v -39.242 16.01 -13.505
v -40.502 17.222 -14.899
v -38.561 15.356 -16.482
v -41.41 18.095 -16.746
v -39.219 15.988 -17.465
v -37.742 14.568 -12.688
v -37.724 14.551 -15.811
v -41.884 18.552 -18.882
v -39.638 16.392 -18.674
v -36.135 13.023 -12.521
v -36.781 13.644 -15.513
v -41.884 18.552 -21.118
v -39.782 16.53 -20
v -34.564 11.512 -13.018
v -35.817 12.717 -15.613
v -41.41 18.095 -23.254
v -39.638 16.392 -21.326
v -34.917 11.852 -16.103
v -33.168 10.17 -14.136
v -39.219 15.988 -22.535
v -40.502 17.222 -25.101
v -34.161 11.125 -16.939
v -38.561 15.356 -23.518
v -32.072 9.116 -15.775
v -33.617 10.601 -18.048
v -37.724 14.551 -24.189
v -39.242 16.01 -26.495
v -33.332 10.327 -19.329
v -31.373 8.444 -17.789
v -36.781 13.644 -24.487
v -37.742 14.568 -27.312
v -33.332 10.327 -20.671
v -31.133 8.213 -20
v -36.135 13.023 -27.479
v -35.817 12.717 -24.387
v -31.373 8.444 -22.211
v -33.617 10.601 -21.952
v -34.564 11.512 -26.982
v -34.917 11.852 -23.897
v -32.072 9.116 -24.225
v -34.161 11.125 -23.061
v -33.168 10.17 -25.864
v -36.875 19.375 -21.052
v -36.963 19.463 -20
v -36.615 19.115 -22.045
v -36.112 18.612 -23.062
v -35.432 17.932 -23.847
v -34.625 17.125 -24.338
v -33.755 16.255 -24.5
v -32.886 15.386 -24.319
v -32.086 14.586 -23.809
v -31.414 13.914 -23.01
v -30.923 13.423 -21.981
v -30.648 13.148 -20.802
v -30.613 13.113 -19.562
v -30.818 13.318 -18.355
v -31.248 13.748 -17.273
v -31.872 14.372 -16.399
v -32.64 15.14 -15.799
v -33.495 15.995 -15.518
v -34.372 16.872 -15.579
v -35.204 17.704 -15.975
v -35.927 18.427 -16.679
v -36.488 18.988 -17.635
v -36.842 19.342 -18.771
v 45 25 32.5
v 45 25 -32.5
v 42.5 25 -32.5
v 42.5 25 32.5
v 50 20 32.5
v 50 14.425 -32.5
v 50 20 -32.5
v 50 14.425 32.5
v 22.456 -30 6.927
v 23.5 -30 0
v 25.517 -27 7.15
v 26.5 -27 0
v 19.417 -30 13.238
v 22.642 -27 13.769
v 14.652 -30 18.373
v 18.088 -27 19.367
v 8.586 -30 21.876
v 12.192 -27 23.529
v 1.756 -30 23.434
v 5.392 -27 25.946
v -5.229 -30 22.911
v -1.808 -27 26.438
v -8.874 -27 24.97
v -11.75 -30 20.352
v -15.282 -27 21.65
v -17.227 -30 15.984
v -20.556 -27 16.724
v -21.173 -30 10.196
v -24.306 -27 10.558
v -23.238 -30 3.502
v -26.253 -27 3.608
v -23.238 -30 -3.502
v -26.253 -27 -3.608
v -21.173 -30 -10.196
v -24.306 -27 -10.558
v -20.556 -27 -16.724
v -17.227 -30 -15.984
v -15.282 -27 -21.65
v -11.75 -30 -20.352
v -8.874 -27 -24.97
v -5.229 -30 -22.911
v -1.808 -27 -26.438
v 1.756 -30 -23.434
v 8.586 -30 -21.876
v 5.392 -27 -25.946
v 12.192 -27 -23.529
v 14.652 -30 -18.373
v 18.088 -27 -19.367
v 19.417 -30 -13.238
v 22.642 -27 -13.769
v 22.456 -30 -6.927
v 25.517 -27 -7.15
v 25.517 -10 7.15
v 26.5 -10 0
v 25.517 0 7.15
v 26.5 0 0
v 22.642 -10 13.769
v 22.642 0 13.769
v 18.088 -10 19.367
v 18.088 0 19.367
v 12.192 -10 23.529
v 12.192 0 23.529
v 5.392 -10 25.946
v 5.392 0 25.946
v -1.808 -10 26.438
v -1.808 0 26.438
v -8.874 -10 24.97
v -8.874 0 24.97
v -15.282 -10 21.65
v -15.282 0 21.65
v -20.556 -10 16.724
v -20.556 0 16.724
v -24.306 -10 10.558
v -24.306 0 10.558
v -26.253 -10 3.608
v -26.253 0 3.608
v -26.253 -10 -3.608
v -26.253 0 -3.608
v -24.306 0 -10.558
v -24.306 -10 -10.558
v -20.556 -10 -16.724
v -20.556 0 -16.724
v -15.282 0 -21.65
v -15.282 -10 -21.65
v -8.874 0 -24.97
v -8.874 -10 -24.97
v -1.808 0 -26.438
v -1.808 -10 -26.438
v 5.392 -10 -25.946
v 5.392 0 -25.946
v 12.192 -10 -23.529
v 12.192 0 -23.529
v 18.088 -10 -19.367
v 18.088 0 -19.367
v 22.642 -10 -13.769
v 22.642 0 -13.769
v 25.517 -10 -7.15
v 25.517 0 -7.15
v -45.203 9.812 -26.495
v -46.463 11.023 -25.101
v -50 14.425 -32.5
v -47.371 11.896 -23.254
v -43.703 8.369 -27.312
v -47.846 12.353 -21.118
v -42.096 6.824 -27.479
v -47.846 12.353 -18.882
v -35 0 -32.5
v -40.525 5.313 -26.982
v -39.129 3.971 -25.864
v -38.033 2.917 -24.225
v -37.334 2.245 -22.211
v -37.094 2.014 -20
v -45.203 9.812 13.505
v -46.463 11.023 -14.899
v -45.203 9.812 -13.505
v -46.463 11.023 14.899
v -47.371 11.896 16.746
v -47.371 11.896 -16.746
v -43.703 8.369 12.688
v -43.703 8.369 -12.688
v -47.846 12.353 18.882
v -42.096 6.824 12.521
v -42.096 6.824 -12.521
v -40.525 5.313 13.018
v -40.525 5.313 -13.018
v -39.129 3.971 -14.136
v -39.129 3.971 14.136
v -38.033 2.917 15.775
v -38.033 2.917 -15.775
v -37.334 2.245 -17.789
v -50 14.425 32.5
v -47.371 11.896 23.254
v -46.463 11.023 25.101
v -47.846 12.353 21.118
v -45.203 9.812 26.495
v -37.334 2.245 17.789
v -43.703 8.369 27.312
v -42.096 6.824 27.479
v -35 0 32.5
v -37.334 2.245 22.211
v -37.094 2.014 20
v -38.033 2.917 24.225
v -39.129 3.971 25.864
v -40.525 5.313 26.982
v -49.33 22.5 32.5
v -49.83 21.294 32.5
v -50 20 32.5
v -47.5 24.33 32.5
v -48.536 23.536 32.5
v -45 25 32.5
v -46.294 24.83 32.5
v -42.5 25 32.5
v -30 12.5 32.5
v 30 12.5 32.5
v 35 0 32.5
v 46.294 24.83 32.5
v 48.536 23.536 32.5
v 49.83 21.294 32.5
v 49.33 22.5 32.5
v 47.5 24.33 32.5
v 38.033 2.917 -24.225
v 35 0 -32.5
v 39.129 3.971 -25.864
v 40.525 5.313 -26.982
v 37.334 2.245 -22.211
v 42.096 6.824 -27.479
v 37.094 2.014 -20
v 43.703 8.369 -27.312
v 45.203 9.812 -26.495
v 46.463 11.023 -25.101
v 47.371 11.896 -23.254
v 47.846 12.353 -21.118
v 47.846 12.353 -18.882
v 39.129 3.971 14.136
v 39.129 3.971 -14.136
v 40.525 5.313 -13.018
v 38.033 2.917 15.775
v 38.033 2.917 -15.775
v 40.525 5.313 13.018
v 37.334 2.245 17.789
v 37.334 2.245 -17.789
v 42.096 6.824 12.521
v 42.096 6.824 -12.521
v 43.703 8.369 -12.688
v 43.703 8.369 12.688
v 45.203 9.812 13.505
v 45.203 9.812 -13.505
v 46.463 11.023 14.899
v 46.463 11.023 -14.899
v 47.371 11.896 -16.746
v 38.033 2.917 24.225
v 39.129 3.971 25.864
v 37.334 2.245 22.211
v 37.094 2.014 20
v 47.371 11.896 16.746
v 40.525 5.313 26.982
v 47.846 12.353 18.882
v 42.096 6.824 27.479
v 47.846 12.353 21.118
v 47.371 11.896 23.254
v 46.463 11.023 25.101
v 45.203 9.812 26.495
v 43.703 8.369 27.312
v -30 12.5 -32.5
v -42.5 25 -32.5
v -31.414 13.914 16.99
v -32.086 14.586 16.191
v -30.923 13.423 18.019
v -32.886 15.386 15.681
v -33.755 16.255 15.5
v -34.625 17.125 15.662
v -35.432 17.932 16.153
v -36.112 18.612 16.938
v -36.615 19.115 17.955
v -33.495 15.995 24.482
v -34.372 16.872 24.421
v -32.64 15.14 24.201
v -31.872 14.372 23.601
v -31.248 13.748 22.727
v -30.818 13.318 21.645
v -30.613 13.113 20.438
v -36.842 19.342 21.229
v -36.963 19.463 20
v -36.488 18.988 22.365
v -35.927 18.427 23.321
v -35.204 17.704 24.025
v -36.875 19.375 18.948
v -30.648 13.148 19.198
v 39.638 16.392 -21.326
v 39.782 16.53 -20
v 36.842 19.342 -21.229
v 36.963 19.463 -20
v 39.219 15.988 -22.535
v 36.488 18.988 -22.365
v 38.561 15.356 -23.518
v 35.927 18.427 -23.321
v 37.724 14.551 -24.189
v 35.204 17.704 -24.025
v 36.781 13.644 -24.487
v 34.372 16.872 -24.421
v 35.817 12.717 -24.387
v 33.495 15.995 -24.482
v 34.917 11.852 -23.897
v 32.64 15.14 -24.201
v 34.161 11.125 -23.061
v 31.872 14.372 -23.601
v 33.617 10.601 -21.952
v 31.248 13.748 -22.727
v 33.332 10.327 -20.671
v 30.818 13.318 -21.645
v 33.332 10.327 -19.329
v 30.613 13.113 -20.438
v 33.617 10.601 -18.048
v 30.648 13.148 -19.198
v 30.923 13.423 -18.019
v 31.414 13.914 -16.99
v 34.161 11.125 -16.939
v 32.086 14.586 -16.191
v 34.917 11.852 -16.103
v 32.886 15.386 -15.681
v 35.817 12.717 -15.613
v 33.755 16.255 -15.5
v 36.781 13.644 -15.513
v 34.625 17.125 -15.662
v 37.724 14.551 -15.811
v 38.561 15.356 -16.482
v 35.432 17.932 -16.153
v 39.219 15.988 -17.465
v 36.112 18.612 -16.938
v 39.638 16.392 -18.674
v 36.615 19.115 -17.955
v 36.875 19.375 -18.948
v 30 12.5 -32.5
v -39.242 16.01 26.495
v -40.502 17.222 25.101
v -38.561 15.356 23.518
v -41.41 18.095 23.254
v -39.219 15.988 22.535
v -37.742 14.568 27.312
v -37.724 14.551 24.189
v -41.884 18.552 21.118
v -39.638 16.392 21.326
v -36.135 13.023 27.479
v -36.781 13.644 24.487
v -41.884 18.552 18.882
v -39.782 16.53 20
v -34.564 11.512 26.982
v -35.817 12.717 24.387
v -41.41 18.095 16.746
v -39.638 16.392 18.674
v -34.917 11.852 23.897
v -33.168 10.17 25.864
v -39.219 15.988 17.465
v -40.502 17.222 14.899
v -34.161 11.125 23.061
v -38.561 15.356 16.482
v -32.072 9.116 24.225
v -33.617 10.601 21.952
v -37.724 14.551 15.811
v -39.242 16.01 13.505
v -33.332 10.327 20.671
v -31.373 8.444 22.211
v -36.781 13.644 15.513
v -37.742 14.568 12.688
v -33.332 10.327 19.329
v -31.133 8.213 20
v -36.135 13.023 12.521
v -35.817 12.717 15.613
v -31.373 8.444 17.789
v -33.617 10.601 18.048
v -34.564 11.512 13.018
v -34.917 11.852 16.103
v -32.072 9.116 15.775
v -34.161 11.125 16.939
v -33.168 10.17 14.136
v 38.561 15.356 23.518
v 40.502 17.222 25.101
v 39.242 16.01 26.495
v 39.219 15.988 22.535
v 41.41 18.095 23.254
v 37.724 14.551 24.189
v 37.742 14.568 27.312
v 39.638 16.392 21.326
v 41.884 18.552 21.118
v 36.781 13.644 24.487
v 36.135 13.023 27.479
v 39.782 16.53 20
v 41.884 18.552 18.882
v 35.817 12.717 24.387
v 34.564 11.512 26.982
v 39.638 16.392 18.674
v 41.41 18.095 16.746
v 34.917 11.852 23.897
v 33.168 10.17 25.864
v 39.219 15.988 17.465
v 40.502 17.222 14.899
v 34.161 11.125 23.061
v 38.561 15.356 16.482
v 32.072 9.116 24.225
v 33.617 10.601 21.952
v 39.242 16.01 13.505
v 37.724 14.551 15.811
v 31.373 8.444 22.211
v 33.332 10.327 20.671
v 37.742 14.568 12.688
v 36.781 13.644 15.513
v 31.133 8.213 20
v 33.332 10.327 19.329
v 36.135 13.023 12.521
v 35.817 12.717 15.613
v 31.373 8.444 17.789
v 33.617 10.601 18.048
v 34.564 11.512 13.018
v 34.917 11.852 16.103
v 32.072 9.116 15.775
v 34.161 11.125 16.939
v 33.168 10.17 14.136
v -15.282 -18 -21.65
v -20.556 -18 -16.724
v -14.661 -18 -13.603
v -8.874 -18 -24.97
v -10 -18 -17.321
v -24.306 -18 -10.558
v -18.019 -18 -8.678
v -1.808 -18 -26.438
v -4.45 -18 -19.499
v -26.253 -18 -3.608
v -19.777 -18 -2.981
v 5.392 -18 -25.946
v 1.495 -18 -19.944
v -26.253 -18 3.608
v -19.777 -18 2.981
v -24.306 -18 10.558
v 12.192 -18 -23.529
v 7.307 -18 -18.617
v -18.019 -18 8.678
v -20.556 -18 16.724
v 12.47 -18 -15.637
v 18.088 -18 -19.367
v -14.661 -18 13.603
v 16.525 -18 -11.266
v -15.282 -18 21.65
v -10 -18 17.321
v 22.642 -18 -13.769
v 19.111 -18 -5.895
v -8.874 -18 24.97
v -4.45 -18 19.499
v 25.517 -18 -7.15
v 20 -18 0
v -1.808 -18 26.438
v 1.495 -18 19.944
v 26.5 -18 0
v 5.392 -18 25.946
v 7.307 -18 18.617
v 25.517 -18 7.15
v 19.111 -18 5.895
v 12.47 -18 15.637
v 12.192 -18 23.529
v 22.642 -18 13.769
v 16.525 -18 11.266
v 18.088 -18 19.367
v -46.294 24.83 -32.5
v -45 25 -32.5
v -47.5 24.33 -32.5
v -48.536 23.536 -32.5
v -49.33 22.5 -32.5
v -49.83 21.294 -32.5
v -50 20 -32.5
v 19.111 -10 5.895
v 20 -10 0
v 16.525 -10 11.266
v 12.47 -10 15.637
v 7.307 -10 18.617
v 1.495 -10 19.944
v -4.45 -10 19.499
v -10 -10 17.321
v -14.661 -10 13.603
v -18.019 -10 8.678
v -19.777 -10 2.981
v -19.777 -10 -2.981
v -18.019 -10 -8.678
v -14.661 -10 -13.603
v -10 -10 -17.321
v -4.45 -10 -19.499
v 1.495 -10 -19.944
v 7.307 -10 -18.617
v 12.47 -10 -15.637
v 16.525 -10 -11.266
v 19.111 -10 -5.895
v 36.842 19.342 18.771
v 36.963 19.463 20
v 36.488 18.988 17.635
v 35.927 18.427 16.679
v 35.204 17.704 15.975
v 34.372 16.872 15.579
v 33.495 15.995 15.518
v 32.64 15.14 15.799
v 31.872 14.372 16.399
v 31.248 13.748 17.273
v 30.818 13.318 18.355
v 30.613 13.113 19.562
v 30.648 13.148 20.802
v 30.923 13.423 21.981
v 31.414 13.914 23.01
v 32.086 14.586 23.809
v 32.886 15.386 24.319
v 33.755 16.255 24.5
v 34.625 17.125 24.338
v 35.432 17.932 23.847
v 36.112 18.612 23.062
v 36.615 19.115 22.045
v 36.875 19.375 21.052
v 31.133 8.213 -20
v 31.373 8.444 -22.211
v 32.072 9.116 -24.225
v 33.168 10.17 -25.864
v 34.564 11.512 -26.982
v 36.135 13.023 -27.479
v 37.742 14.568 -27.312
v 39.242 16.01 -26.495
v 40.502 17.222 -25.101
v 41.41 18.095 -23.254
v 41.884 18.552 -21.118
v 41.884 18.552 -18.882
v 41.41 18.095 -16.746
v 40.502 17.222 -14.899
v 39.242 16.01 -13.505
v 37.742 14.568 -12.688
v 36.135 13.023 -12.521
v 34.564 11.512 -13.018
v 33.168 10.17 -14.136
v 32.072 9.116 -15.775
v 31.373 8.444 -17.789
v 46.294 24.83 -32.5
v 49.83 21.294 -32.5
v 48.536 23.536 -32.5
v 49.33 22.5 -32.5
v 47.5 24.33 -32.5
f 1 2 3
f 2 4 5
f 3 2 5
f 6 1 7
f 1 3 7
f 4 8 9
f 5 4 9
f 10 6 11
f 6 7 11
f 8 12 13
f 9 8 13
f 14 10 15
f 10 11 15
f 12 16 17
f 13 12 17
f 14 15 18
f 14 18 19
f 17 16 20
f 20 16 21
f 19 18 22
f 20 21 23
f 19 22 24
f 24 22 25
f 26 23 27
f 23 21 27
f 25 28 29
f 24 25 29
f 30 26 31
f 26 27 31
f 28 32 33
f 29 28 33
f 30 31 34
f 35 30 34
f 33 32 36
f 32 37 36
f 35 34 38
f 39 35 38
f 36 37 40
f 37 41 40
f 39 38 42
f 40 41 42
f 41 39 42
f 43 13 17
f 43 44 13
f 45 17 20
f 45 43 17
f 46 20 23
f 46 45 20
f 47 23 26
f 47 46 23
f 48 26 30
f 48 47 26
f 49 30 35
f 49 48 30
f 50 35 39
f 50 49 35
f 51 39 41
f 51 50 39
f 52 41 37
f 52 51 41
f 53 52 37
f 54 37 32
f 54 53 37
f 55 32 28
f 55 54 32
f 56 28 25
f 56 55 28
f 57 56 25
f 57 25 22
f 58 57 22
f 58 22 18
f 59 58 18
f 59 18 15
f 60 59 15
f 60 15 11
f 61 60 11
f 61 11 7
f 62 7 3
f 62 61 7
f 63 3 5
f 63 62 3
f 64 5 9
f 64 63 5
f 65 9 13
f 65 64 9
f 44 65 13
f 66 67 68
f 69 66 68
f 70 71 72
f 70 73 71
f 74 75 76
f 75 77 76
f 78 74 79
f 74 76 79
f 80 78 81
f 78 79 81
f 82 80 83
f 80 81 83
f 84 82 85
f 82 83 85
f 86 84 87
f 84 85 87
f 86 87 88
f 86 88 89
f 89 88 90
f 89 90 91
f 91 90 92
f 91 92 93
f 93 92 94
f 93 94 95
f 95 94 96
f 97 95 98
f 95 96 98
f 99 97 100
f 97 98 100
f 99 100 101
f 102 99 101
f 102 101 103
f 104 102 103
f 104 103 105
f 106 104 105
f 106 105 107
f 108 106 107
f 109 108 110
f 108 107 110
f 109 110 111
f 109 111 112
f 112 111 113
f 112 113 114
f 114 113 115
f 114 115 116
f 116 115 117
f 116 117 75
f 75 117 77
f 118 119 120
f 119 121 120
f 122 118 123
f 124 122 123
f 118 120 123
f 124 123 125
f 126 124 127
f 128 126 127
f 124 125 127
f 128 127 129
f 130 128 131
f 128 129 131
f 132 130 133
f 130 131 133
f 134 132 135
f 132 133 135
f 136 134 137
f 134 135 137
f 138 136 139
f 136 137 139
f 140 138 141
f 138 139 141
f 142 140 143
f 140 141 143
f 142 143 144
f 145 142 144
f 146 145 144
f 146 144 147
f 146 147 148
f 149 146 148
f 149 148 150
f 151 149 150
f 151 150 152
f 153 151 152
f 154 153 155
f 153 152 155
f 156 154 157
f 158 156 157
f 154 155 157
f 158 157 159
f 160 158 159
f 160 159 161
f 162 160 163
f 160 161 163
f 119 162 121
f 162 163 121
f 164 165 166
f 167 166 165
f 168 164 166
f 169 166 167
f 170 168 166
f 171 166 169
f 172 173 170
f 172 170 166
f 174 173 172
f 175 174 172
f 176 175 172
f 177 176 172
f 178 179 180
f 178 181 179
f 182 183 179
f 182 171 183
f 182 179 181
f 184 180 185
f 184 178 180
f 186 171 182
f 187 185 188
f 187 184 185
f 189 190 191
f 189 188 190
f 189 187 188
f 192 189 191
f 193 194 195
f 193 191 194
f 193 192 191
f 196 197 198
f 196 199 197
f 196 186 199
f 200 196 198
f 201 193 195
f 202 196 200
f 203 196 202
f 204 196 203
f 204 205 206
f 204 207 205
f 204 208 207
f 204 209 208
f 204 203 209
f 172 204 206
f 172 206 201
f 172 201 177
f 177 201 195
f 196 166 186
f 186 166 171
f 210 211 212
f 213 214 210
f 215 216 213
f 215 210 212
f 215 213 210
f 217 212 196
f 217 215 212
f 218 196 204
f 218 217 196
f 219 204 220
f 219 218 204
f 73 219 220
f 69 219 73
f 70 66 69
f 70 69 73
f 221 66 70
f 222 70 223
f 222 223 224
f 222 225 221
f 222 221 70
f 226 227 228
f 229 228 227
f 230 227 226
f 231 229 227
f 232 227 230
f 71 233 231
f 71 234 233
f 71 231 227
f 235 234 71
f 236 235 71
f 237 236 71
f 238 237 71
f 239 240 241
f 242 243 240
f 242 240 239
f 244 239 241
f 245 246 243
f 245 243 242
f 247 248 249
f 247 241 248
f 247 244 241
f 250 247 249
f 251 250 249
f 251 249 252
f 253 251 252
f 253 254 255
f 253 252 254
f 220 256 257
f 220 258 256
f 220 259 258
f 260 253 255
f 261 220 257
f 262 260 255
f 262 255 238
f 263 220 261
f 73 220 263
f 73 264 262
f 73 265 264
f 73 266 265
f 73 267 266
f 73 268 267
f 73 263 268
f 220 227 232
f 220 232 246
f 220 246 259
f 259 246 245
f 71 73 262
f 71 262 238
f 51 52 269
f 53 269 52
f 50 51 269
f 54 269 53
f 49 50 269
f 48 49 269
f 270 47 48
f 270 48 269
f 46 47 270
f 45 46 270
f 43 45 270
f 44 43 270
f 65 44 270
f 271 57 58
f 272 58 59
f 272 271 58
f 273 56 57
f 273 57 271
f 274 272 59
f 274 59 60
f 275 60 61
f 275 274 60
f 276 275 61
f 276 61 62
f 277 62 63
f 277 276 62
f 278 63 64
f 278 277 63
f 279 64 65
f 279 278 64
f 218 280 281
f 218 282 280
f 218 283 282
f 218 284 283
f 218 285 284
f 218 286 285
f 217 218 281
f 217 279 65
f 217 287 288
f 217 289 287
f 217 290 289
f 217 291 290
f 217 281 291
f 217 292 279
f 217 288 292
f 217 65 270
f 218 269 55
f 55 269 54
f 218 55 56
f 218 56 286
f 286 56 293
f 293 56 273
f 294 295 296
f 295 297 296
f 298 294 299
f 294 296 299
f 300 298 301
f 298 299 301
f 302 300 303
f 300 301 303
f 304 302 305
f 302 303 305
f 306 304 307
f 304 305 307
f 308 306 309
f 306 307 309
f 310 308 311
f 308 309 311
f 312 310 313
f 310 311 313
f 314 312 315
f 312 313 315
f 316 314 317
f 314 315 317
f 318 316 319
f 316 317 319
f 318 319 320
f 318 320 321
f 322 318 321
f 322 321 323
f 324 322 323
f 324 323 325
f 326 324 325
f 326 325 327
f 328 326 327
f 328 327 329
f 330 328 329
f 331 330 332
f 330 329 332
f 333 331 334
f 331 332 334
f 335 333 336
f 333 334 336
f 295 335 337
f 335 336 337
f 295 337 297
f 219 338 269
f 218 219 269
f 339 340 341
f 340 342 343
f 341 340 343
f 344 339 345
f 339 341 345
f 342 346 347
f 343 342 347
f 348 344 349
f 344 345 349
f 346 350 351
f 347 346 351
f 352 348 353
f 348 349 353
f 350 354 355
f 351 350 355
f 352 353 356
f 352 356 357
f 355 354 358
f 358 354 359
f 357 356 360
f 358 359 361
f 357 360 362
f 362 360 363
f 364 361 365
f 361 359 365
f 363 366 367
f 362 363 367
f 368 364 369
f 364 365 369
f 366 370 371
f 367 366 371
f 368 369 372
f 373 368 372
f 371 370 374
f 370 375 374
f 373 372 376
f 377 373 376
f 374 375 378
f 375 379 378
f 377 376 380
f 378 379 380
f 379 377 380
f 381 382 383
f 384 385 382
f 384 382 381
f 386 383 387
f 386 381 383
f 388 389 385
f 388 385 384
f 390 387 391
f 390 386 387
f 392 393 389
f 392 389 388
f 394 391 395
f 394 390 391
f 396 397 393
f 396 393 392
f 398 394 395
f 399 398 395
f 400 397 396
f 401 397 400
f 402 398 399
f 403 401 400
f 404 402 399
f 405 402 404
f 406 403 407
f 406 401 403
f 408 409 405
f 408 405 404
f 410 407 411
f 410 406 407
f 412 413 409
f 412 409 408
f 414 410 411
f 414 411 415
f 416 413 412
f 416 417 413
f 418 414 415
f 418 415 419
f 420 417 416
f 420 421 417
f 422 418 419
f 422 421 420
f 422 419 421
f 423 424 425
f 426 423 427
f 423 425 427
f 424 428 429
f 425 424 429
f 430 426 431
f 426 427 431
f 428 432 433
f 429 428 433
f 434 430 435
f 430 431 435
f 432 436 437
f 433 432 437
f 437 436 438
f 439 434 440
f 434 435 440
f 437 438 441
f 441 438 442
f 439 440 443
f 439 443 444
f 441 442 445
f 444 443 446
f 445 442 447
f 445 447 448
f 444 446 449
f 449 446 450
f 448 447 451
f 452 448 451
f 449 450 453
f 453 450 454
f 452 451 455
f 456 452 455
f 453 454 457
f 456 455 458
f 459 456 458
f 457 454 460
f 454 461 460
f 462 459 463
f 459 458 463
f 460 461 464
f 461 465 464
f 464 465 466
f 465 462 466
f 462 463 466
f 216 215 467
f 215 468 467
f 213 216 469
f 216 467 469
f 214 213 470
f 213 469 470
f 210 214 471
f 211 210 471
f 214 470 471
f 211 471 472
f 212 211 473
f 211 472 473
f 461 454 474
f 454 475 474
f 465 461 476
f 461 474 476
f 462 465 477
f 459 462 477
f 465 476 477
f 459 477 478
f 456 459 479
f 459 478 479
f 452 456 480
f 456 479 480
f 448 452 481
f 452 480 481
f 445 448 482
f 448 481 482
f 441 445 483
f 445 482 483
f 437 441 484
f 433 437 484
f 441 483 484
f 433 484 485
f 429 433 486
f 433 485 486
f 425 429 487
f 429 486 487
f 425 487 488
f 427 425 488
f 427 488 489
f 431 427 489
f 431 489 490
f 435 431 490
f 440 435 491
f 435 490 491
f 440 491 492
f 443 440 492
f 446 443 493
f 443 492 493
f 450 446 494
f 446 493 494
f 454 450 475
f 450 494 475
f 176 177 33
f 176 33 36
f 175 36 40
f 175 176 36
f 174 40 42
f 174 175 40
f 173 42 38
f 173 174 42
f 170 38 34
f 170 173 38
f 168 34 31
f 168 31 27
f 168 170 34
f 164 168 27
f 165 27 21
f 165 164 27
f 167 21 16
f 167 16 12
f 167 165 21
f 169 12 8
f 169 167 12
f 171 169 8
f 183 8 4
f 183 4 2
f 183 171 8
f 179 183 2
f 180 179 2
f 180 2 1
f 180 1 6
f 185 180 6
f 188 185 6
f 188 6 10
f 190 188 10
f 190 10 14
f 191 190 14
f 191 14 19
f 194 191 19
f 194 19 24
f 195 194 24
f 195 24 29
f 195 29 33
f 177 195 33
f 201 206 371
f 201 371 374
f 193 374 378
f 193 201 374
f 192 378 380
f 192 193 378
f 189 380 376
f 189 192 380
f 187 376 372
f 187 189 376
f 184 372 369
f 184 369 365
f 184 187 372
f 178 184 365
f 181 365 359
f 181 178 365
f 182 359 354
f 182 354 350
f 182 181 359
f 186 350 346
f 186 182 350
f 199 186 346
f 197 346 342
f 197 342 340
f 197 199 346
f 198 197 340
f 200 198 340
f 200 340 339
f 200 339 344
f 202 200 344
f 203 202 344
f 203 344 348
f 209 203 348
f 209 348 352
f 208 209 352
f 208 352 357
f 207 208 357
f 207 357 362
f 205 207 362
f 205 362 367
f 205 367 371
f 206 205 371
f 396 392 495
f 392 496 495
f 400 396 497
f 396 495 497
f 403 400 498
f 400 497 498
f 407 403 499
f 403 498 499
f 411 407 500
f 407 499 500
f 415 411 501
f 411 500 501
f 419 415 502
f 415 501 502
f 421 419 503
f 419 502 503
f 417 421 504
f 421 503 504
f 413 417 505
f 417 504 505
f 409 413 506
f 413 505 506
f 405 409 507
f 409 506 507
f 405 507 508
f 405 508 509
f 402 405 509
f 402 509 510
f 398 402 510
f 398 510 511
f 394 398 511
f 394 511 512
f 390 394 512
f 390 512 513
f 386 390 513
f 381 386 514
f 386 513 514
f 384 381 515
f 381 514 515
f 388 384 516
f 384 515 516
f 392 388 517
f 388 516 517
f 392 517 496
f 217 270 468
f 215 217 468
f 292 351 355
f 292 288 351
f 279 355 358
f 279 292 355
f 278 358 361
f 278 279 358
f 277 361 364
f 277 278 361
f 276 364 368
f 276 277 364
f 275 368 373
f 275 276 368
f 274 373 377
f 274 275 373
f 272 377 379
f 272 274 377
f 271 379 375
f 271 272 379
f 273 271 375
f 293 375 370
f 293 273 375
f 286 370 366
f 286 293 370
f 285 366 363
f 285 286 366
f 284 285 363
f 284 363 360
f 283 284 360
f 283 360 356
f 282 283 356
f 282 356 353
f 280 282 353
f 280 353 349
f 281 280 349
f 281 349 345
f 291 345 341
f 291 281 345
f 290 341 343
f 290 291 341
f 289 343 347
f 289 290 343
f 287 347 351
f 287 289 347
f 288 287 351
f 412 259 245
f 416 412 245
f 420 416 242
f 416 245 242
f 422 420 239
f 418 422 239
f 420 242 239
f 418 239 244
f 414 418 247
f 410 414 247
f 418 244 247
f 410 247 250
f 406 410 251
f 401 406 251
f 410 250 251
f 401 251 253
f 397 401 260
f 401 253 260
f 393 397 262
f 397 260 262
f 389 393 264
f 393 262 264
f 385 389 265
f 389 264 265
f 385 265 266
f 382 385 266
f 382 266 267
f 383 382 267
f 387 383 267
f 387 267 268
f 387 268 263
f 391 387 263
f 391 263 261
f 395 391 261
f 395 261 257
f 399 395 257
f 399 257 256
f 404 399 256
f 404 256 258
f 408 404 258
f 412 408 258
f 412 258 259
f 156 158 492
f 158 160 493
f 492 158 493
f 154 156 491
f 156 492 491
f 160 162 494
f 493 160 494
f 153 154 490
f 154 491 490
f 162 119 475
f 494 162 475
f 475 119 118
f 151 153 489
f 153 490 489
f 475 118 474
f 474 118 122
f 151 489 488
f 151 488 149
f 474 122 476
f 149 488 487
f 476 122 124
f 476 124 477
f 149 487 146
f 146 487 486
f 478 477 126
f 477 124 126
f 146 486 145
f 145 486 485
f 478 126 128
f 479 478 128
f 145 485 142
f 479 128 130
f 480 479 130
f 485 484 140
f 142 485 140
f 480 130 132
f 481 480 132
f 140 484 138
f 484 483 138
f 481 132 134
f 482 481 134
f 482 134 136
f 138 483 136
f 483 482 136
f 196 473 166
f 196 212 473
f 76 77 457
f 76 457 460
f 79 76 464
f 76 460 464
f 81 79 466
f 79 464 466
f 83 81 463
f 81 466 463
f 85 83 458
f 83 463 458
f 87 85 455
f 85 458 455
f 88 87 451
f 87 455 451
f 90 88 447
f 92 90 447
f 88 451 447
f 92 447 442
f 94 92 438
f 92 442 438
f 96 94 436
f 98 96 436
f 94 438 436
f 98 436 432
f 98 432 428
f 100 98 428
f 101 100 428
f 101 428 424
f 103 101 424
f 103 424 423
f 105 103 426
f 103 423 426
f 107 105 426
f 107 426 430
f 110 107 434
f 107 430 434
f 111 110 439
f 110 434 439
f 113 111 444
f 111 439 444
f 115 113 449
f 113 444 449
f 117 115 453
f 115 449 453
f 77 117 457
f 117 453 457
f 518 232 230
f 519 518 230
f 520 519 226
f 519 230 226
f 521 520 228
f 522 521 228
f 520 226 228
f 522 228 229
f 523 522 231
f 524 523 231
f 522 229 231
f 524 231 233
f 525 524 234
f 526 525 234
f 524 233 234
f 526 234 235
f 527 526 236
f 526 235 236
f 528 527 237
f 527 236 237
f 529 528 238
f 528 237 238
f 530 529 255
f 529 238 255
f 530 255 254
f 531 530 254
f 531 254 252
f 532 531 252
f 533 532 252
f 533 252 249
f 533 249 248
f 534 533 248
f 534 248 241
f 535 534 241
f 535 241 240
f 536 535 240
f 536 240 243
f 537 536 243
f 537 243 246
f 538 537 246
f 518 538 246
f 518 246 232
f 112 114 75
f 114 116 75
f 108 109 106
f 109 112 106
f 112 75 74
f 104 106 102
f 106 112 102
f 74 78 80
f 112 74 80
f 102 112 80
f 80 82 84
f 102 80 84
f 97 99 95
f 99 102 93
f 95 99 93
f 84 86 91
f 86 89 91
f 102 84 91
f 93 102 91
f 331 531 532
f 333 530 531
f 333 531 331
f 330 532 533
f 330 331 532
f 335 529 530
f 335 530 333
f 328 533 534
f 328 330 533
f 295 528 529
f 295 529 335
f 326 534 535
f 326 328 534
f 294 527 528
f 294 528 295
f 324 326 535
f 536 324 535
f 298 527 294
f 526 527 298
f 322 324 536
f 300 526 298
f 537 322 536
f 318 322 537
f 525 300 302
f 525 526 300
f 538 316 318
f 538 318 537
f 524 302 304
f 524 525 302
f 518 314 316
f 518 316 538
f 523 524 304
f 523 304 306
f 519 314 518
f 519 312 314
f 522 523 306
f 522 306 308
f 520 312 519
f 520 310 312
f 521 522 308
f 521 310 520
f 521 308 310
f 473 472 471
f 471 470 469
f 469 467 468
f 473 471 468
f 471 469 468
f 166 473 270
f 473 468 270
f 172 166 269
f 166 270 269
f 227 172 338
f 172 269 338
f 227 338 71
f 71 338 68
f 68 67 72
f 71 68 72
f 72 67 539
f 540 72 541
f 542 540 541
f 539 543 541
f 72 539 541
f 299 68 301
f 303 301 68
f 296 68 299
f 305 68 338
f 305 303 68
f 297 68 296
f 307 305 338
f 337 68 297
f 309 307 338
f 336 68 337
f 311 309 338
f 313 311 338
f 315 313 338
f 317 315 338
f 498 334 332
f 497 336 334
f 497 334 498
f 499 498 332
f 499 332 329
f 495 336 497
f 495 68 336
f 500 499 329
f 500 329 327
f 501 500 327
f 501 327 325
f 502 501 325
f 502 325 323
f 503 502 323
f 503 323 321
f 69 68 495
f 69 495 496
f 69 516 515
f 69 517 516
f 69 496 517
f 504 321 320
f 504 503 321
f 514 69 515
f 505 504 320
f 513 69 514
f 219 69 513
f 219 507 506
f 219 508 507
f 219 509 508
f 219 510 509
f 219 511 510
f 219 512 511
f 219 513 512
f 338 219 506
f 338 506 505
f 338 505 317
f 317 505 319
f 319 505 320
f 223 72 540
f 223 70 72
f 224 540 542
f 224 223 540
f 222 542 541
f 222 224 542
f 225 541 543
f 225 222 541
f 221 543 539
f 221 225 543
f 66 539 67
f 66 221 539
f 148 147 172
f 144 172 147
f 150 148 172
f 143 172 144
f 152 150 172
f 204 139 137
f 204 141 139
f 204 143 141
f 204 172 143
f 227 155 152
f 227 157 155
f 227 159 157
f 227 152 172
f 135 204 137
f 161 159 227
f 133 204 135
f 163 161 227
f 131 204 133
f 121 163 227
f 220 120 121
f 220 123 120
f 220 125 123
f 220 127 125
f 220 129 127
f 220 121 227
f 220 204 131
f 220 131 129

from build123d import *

# Parameters (mm, degrees)
BOSS_EXTRUDE1_DEPTH                                 = 32.5
CBORE_FOR_M8_HEX_SOCKET_HEAD_CAP_SCREW1_D           = 9
CBORE_FOR_M8_HEX_SOCKET_HEAD_CAP_SCREW1_CBORE_D     = 15
CBORE_FOR_M8_HEX_SOCKET_HEAD_CAP_SCREW1_CBORE_DEPTH = 8.6
FILLET1_R                                           = 5


with BuildPart() as part:
    # Sketch1 → Boss-Extrude1 (new body, symmetric)
    with BuildSketch(Plane.XY):
        Polygon((-35, 0), (35, 0), (50, 14.424703588), (50, 25), (42.5, 25), (30, 12.5), (-30, 12.5), (-42.5, 25), (-50, 25), (-50, 14.424703588), align=None)
    extrude(amount=BOSS_EXTRUDE1_DEPTH, both=True)

    # Sketch2 → Revolve1 (revolve)
    with BuildSketch(Plane.XY):
        Polygon((23.5, -30), (26.5, -27), (26.5, -18), (20, -18), (20, -10), (26.5, -10), (26.5, 0), (0, 0), (0, -30), align=None)
    revolve(axis=Axis((0, 0, 0), (0, -1, 0)))

    # CBORE for M8 Hex Socket Head Cap Screw1 (through all)
    with Locations(Plane(origin=(16.815959791, -17.486626004, 0), x_dir=(-0.720794011, -0.69314933, 0), z_dir=(0.69314933, -0.720794011, 0))):
        with Locations((-35.632982274, -20), (-35.632982274, 20)):
            cbore_for_m8_hex_socket_head_cap_screw1 = CounterBoreHole(CBORE_FOR_M8_HEX_SOCKET_HEAD_CAP_SCREW1_D / 2, CBORE_FOR_M8_HEX_SOCKET_HEAD_CAP_SCREW1_CBORE_D / 2, CBORE_FOR_M8_HEX_SOCKET_HEAD_CAP_SCREW1_CBORE_DEPTH)

    # Mirror1: CBORE for M8 Hex Socket Head Cap Screw1 across plane
    add(cbore_for_m8_hex_socket_head_cap_screw1.mirror(Plane(origin=(0, 0, 0), x_dir=(0, 0, 1), z_dir=(1, 0, 0))), mode=Mode.SUBTRACT)

    # Fillet1
    fillet1_edges = [part.edges().sort_by_distance(p)[0] for p in [
        (50, 25, 0),
        (-50, 25, 0),
    ]]
    fillet(fillet1_edges, radius=FILLET1_R)


solid = part.part
